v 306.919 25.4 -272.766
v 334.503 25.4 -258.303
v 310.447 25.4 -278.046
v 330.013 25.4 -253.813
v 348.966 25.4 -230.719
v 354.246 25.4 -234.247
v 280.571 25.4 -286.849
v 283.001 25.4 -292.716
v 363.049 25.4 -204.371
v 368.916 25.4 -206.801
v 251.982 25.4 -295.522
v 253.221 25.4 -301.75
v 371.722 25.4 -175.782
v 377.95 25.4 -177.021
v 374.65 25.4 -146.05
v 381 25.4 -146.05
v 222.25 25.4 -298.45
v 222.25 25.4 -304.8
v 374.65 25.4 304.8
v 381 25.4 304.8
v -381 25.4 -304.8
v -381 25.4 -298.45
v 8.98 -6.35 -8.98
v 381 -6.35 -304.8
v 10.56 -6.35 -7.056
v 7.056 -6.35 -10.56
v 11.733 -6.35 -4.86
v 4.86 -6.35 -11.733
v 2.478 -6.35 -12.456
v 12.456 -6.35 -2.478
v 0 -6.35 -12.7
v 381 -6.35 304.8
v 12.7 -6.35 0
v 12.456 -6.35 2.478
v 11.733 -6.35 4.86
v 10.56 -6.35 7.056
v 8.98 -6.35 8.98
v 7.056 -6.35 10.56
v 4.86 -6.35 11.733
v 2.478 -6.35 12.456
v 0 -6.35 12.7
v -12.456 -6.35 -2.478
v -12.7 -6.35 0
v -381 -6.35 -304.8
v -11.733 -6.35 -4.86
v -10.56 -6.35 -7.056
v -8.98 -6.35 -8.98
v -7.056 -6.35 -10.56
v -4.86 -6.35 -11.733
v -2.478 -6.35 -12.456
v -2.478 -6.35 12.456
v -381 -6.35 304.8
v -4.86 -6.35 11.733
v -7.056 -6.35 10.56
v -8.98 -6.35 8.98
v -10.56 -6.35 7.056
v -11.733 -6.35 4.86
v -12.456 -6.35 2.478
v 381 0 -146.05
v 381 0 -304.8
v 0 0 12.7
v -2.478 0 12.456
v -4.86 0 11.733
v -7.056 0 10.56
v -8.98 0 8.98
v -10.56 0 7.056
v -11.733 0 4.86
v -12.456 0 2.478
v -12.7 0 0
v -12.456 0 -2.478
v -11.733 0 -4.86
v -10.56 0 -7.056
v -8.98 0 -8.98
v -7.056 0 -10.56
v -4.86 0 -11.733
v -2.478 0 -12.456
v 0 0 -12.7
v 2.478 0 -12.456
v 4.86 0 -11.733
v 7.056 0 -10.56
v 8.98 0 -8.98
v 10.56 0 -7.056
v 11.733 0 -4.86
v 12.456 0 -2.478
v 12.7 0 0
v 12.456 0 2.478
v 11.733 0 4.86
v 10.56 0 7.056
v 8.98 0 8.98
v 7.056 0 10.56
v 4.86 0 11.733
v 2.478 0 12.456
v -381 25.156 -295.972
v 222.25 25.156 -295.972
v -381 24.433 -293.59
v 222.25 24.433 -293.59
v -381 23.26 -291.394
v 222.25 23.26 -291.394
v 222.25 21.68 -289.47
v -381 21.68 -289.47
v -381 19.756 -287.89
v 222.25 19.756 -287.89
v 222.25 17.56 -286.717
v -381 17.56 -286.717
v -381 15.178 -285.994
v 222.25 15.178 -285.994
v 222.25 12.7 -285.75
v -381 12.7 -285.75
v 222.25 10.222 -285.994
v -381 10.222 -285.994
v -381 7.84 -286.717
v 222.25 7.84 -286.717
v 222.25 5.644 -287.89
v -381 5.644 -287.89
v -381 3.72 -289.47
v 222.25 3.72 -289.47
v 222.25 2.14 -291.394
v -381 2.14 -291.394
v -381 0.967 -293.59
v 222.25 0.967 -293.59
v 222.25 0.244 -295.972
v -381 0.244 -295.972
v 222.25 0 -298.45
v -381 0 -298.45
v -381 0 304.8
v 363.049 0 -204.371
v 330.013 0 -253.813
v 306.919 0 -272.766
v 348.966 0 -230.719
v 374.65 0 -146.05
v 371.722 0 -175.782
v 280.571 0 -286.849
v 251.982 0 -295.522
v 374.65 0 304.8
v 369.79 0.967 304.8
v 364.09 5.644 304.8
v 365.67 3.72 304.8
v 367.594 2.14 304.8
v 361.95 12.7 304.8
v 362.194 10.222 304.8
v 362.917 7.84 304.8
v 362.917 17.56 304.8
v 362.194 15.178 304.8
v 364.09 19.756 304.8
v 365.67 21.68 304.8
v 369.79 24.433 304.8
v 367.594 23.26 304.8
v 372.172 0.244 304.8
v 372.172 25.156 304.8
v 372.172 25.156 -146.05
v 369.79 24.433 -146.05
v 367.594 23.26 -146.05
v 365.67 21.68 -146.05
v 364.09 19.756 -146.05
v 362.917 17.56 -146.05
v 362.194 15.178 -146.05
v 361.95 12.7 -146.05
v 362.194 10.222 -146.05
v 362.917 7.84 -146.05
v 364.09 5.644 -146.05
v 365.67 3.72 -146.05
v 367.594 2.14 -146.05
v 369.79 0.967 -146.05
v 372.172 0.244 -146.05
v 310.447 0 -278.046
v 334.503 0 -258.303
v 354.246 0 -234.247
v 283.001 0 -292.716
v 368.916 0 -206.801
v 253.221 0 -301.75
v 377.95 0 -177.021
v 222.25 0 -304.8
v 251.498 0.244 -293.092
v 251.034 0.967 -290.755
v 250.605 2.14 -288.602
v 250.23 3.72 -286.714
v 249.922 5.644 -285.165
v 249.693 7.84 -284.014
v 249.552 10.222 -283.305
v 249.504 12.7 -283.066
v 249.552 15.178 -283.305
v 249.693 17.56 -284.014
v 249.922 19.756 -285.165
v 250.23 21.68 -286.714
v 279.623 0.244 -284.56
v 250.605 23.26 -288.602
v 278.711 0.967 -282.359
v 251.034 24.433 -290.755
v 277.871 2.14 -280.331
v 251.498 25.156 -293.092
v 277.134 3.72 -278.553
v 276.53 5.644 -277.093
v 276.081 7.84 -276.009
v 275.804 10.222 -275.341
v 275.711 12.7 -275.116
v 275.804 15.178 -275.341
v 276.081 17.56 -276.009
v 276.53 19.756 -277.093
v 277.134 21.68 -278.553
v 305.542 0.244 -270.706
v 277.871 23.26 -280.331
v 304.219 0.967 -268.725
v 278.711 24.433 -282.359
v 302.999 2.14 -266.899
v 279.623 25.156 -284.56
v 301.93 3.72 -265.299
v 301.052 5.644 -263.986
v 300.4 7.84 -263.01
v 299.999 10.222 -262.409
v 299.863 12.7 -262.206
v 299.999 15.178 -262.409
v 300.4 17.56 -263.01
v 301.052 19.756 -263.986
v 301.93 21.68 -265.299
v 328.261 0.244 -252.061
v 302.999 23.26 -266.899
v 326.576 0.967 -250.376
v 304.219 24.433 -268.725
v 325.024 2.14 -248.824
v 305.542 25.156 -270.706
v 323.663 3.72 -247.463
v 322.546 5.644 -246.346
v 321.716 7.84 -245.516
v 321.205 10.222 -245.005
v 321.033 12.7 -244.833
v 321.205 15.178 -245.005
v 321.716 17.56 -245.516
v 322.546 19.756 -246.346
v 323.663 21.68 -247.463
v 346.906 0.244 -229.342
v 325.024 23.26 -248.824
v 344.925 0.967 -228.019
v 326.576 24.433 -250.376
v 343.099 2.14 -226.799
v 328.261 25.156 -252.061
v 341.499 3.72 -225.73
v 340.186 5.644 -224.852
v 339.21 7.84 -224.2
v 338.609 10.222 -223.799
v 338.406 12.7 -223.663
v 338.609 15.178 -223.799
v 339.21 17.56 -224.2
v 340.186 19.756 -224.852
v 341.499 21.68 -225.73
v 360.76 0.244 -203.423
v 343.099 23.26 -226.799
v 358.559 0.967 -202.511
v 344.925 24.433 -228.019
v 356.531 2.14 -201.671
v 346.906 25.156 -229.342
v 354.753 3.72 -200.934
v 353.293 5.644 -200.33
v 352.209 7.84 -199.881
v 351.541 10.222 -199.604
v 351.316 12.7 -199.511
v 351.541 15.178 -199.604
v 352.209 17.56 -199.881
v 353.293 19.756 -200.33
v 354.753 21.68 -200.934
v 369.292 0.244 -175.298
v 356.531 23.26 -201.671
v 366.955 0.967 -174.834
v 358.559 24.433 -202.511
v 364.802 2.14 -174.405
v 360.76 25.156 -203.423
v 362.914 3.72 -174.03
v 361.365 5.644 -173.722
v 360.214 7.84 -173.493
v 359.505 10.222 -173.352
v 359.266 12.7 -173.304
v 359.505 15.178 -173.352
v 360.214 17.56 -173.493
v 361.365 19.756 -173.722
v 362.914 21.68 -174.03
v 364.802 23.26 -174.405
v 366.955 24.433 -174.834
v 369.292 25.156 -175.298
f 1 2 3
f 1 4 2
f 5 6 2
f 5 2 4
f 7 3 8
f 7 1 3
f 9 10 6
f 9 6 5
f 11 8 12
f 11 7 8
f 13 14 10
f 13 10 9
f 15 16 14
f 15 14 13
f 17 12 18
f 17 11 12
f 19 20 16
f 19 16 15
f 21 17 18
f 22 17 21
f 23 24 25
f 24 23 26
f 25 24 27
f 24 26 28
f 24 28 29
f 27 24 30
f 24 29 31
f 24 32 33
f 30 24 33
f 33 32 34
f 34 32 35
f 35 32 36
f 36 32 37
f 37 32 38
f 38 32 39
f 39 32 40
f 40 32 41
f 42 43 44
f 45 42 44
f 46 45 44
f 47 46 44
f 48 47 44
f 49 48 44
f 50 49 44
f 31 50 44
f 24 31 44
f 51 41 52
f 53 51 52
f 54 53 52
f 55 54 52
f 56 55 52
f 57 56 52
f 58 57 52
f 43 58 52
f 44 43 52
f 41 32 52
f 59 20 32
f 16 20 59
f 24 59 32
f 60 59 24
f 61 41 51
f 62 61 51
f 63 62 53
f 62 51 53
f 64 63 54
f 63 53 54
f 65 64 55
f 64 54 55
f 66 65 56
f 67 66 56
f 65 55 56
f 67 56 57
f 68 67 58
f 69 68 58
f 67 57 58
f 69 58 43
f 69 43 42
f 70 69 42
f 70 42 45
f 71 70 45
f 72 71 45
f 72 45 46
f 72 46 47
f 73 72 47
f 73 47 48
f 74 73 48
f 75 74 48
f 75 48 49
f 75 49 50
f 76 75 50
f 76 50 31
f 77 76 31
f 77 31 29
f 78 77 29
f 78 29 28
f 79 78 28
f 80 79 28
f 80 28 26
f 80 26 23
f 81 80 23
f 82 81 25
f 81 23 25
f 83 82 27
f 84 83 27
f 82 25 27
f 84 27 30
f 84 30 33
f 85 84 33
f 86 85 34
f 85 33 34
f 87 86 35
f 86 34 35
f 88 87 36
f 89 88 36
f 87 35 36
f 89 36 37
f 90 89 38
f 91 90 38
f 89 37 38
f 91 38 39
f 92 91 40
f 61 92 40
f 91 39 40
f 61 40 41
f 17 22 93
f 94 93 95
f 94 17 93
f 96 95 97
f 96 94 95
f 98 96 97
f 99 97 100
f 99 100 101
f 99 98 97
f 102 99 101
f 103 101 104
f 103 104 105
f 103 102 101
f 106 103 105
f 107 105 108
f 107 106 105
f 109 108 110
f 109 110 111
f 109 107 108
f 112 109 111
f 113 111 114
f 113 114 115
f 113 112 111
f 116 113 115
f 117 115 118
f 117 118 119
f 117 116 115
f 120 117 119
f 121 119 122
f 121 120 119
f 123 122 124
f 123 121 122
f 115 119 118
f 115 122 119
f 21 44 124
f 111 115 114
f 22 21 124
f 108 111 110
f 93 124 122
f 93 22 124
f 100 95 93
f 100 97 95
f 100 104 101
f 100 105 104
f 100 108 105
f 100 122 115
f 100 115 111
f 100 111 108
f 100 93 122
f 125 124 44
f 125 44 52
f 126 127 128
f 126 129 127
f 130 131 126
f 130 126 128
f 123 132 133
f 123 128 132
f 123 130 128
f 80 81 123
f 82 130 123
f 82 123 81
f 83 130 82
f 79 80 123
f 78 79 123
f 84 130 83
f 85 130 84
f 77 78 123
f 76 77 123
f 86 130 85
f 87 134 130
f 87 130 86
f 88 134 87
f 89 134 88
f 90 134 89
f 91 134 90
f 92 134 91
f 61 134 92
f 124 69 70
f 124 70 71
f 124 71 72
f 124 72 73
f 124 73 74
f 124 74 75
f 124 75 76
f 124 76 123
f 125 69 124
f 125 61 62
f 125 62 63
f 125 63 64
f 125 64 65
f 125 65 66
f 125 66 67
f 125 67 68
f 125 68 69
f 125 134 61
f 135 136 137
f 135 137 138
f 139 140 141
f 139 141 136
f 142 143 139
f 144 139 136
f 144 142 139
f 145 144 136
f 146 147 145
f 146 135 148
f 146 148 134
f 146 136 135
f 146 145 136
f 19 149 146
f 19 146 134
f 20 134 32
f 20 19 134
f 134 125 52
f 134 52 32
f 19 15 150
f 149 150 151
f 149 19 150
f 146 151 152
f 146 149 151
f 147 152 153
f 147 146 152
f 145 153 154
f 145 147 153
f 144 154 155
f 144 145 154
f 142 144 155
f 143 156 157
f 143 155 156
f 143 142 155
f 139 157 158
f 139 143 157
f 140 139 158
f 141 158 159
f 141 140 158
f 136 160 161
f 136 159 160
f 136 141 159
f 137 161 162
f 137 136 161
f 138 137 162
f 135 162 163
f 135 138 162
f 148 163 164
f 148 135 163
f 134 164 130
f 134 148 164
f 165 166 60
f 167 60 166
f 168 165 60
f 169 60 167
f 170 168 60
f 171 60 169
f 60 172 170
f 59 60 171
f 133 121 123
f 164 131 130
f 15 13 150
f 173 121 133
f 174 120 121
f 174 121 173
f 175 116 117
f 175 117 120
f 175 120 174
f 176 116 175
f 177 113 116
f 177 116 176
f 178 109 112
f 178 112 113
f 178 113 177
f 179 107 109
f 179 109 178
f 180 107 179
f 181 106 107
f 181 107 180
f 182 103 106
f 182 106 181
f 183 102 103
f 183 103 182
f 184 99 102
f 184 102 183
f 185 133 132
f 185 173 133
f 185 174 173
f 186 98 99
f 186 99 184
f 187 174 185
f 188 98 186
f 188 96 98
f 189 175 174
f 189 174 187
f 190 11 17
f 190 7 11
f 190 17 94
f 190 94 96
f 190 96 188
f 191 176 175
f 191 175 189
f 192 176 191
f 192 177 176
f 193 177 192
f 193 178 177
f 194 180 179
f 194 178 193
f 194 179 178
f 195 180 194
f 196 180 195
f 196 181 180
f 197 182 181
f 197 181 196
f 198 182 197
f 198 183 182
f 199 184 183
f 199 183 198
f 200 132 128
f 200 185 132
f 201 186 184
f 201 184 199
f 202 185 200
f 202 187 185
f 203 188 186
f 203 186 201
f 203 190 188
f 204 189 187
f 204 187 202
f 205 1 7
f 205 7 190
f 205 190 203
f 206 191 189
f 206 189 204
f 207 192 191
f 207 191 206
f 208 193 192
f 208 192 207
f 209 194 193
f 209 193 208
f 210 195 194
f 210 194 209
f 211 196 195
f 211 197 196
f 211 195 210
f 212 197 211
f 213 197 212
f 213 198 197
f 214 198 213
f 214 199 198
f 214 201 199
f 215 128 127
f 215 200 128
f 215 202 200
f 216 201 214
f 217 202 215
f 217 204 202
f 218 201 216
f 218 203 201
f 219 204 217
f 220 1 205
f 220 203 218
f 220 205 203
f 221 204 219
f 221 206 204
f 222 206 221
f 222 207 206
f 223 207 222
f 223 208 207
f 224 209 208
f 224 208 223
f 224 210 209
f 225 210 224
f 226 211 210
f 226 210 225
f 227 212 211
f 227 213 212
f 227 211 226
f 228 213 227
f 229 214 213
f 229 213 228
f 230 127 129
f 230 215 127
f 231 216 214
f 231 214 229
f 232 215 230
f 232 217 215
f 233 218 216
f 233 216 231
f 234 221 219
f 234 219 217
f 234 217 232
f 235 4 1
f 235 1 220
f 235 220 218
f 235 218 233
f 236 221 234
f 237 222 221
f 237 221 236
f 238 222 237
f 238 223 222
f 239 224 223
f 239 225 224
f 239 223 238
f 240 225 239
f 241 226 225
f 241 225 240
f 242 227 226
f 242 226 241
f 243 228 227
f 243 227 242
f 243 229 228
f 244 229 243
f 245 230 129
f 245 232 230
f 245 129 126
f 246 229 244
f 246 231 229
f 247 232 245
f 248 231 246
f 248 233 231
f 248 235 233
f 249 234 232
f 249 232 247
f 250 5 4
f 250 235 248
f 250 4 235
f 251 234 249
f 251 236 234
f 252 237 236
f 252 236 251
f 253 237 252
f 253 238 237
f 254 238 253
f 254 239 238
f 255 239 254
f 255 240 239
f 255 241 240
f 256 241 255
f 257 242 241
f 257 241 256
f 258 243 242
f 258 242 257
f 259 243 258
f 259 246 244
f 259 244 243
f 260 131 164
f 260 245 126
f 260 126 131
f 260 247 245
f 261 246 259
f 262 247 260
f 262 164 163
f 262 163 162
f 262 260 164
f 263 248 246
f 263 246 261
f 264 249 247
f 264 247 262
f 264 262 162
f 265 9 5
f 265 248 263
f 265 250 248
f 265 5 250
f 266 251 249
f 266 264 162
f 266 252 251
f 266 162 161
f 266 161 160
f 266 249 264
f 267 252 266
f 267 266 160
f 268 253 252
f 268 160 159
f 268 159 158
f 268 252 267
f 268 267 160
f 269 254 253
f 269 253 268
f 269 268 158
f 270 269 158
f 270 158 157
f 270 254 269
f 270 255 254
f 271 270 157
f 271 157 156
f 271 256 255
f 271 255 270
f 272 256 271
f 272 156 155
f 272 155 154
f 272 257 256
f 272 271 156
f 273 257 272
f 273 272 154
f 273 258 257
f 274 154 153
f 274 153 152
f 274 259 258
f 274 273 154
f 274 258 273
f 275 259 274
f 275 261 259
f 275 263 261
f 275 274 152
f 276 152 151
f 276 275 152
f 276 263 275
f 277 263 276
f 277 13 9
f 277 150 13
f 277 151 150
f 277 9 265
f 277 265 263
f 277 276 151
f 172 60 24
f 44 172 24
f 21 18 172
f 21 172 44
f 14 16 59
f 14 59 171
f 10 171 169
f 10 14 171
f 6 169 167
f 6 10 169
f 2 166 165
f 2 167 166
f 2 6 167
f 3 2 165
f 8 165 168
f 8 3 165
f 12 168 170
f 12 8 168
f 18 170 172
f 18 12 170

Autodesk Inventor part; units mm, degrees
ref_plane "YZ Plane" through (0, 0, 0) normal (1, 0, 0) x (0, 1, 0)
sketch "Sketch1" plane through (0, 0, 0) normal (0, 1, 0) x (-1, 0, 0)
  line L0 (-381, 304.8) -> (-381, -304.8)
  line L1 (-381, -304.8) -> (381, -304.8)
  line L2 (381, -304.8) -> (381, 304.8)
  line L3 (381, 304.8) -> (-381, 304.8)
  line L4 (-381, 304.8) -> (381, -304.8) construction
  line L5 (-381, -304.8) -> (381, 304.8) construction
  point P0 (0, 0)
  dimension "width" = 609.6
  dimension "length" = 762
extrude "Extrusion1" add sketch "Sketch1" against normal blind 6.35
ref_plane "Work Plane3" through (-381, 0, 304.8) normal (0, 0, 1) x (1, 0, 0)
sketch "Sketch5" plane through (-381, 0, 304.8) normal (0, 0, 1) x (1, 0, 0)
  line L0 (762, 0) -> (755.65, 0)
  line L1 (755.65, 25.4) -> (762, 25.4)
  line L2 (762, 25.4) -> (762, 0)
  arc A0 (755.65, 25.4) -> (755.65, 0) centre (755.65, 12.7) ccw
  point P0 (381, 0)
  dimension "d16" = 25.4
ref_plane "Work Plane4" through (0, 12.7, 0) normal (0, 1, 0) x (1, 0, 0)
sketch "Sketch6" plane through (0, 12.7, 0) normal (0, 1, 0) x (1, 0, 0)
  line L0 (-381, 304.8) -> (381, 304.8) construction
  line L1 (222.25, 304.8) -> (222.25, 146.05) construction
  line L2 (222.25, 146.05) -> (381, 146.05) construction
  line L3 (381, 304.8) -> (381, -304.8) construction
  arc A0 (368.3, 146.05) -> (222.25, 292.1) centre (222.25, 146.05) ccw
  line L4 (222.25, 292.1) -> (-381, 292.1)
  line L5 (-381, -304.8) -> (-381, 304.8) projected
  line L6 (368.3, 146.05) -> (368.3, -304.8)
  line L7 (381, -304.8) -> (-381, -304.8) projected
  point P0 (0, 0)
  dimension "d20" = 158.75
  dimension "diameterOfFrisbee" = 292.1
sweep "Sweep2" add profiles "Sketch5" path "Sketch6" path curves L6 A0 L4
sketch "Sketch7" plane through (0, 0, 0) normal (0, 1, 0) x (1, 0, 0)
  point P0 (0, 0)
  point P1 (0, 0)
hole "Hole1" at (0, 0, 0) direction (0, -1, 0) diameter 25.4 end through all
properties part number "ShooterBase" material "Wood (Birch)"
